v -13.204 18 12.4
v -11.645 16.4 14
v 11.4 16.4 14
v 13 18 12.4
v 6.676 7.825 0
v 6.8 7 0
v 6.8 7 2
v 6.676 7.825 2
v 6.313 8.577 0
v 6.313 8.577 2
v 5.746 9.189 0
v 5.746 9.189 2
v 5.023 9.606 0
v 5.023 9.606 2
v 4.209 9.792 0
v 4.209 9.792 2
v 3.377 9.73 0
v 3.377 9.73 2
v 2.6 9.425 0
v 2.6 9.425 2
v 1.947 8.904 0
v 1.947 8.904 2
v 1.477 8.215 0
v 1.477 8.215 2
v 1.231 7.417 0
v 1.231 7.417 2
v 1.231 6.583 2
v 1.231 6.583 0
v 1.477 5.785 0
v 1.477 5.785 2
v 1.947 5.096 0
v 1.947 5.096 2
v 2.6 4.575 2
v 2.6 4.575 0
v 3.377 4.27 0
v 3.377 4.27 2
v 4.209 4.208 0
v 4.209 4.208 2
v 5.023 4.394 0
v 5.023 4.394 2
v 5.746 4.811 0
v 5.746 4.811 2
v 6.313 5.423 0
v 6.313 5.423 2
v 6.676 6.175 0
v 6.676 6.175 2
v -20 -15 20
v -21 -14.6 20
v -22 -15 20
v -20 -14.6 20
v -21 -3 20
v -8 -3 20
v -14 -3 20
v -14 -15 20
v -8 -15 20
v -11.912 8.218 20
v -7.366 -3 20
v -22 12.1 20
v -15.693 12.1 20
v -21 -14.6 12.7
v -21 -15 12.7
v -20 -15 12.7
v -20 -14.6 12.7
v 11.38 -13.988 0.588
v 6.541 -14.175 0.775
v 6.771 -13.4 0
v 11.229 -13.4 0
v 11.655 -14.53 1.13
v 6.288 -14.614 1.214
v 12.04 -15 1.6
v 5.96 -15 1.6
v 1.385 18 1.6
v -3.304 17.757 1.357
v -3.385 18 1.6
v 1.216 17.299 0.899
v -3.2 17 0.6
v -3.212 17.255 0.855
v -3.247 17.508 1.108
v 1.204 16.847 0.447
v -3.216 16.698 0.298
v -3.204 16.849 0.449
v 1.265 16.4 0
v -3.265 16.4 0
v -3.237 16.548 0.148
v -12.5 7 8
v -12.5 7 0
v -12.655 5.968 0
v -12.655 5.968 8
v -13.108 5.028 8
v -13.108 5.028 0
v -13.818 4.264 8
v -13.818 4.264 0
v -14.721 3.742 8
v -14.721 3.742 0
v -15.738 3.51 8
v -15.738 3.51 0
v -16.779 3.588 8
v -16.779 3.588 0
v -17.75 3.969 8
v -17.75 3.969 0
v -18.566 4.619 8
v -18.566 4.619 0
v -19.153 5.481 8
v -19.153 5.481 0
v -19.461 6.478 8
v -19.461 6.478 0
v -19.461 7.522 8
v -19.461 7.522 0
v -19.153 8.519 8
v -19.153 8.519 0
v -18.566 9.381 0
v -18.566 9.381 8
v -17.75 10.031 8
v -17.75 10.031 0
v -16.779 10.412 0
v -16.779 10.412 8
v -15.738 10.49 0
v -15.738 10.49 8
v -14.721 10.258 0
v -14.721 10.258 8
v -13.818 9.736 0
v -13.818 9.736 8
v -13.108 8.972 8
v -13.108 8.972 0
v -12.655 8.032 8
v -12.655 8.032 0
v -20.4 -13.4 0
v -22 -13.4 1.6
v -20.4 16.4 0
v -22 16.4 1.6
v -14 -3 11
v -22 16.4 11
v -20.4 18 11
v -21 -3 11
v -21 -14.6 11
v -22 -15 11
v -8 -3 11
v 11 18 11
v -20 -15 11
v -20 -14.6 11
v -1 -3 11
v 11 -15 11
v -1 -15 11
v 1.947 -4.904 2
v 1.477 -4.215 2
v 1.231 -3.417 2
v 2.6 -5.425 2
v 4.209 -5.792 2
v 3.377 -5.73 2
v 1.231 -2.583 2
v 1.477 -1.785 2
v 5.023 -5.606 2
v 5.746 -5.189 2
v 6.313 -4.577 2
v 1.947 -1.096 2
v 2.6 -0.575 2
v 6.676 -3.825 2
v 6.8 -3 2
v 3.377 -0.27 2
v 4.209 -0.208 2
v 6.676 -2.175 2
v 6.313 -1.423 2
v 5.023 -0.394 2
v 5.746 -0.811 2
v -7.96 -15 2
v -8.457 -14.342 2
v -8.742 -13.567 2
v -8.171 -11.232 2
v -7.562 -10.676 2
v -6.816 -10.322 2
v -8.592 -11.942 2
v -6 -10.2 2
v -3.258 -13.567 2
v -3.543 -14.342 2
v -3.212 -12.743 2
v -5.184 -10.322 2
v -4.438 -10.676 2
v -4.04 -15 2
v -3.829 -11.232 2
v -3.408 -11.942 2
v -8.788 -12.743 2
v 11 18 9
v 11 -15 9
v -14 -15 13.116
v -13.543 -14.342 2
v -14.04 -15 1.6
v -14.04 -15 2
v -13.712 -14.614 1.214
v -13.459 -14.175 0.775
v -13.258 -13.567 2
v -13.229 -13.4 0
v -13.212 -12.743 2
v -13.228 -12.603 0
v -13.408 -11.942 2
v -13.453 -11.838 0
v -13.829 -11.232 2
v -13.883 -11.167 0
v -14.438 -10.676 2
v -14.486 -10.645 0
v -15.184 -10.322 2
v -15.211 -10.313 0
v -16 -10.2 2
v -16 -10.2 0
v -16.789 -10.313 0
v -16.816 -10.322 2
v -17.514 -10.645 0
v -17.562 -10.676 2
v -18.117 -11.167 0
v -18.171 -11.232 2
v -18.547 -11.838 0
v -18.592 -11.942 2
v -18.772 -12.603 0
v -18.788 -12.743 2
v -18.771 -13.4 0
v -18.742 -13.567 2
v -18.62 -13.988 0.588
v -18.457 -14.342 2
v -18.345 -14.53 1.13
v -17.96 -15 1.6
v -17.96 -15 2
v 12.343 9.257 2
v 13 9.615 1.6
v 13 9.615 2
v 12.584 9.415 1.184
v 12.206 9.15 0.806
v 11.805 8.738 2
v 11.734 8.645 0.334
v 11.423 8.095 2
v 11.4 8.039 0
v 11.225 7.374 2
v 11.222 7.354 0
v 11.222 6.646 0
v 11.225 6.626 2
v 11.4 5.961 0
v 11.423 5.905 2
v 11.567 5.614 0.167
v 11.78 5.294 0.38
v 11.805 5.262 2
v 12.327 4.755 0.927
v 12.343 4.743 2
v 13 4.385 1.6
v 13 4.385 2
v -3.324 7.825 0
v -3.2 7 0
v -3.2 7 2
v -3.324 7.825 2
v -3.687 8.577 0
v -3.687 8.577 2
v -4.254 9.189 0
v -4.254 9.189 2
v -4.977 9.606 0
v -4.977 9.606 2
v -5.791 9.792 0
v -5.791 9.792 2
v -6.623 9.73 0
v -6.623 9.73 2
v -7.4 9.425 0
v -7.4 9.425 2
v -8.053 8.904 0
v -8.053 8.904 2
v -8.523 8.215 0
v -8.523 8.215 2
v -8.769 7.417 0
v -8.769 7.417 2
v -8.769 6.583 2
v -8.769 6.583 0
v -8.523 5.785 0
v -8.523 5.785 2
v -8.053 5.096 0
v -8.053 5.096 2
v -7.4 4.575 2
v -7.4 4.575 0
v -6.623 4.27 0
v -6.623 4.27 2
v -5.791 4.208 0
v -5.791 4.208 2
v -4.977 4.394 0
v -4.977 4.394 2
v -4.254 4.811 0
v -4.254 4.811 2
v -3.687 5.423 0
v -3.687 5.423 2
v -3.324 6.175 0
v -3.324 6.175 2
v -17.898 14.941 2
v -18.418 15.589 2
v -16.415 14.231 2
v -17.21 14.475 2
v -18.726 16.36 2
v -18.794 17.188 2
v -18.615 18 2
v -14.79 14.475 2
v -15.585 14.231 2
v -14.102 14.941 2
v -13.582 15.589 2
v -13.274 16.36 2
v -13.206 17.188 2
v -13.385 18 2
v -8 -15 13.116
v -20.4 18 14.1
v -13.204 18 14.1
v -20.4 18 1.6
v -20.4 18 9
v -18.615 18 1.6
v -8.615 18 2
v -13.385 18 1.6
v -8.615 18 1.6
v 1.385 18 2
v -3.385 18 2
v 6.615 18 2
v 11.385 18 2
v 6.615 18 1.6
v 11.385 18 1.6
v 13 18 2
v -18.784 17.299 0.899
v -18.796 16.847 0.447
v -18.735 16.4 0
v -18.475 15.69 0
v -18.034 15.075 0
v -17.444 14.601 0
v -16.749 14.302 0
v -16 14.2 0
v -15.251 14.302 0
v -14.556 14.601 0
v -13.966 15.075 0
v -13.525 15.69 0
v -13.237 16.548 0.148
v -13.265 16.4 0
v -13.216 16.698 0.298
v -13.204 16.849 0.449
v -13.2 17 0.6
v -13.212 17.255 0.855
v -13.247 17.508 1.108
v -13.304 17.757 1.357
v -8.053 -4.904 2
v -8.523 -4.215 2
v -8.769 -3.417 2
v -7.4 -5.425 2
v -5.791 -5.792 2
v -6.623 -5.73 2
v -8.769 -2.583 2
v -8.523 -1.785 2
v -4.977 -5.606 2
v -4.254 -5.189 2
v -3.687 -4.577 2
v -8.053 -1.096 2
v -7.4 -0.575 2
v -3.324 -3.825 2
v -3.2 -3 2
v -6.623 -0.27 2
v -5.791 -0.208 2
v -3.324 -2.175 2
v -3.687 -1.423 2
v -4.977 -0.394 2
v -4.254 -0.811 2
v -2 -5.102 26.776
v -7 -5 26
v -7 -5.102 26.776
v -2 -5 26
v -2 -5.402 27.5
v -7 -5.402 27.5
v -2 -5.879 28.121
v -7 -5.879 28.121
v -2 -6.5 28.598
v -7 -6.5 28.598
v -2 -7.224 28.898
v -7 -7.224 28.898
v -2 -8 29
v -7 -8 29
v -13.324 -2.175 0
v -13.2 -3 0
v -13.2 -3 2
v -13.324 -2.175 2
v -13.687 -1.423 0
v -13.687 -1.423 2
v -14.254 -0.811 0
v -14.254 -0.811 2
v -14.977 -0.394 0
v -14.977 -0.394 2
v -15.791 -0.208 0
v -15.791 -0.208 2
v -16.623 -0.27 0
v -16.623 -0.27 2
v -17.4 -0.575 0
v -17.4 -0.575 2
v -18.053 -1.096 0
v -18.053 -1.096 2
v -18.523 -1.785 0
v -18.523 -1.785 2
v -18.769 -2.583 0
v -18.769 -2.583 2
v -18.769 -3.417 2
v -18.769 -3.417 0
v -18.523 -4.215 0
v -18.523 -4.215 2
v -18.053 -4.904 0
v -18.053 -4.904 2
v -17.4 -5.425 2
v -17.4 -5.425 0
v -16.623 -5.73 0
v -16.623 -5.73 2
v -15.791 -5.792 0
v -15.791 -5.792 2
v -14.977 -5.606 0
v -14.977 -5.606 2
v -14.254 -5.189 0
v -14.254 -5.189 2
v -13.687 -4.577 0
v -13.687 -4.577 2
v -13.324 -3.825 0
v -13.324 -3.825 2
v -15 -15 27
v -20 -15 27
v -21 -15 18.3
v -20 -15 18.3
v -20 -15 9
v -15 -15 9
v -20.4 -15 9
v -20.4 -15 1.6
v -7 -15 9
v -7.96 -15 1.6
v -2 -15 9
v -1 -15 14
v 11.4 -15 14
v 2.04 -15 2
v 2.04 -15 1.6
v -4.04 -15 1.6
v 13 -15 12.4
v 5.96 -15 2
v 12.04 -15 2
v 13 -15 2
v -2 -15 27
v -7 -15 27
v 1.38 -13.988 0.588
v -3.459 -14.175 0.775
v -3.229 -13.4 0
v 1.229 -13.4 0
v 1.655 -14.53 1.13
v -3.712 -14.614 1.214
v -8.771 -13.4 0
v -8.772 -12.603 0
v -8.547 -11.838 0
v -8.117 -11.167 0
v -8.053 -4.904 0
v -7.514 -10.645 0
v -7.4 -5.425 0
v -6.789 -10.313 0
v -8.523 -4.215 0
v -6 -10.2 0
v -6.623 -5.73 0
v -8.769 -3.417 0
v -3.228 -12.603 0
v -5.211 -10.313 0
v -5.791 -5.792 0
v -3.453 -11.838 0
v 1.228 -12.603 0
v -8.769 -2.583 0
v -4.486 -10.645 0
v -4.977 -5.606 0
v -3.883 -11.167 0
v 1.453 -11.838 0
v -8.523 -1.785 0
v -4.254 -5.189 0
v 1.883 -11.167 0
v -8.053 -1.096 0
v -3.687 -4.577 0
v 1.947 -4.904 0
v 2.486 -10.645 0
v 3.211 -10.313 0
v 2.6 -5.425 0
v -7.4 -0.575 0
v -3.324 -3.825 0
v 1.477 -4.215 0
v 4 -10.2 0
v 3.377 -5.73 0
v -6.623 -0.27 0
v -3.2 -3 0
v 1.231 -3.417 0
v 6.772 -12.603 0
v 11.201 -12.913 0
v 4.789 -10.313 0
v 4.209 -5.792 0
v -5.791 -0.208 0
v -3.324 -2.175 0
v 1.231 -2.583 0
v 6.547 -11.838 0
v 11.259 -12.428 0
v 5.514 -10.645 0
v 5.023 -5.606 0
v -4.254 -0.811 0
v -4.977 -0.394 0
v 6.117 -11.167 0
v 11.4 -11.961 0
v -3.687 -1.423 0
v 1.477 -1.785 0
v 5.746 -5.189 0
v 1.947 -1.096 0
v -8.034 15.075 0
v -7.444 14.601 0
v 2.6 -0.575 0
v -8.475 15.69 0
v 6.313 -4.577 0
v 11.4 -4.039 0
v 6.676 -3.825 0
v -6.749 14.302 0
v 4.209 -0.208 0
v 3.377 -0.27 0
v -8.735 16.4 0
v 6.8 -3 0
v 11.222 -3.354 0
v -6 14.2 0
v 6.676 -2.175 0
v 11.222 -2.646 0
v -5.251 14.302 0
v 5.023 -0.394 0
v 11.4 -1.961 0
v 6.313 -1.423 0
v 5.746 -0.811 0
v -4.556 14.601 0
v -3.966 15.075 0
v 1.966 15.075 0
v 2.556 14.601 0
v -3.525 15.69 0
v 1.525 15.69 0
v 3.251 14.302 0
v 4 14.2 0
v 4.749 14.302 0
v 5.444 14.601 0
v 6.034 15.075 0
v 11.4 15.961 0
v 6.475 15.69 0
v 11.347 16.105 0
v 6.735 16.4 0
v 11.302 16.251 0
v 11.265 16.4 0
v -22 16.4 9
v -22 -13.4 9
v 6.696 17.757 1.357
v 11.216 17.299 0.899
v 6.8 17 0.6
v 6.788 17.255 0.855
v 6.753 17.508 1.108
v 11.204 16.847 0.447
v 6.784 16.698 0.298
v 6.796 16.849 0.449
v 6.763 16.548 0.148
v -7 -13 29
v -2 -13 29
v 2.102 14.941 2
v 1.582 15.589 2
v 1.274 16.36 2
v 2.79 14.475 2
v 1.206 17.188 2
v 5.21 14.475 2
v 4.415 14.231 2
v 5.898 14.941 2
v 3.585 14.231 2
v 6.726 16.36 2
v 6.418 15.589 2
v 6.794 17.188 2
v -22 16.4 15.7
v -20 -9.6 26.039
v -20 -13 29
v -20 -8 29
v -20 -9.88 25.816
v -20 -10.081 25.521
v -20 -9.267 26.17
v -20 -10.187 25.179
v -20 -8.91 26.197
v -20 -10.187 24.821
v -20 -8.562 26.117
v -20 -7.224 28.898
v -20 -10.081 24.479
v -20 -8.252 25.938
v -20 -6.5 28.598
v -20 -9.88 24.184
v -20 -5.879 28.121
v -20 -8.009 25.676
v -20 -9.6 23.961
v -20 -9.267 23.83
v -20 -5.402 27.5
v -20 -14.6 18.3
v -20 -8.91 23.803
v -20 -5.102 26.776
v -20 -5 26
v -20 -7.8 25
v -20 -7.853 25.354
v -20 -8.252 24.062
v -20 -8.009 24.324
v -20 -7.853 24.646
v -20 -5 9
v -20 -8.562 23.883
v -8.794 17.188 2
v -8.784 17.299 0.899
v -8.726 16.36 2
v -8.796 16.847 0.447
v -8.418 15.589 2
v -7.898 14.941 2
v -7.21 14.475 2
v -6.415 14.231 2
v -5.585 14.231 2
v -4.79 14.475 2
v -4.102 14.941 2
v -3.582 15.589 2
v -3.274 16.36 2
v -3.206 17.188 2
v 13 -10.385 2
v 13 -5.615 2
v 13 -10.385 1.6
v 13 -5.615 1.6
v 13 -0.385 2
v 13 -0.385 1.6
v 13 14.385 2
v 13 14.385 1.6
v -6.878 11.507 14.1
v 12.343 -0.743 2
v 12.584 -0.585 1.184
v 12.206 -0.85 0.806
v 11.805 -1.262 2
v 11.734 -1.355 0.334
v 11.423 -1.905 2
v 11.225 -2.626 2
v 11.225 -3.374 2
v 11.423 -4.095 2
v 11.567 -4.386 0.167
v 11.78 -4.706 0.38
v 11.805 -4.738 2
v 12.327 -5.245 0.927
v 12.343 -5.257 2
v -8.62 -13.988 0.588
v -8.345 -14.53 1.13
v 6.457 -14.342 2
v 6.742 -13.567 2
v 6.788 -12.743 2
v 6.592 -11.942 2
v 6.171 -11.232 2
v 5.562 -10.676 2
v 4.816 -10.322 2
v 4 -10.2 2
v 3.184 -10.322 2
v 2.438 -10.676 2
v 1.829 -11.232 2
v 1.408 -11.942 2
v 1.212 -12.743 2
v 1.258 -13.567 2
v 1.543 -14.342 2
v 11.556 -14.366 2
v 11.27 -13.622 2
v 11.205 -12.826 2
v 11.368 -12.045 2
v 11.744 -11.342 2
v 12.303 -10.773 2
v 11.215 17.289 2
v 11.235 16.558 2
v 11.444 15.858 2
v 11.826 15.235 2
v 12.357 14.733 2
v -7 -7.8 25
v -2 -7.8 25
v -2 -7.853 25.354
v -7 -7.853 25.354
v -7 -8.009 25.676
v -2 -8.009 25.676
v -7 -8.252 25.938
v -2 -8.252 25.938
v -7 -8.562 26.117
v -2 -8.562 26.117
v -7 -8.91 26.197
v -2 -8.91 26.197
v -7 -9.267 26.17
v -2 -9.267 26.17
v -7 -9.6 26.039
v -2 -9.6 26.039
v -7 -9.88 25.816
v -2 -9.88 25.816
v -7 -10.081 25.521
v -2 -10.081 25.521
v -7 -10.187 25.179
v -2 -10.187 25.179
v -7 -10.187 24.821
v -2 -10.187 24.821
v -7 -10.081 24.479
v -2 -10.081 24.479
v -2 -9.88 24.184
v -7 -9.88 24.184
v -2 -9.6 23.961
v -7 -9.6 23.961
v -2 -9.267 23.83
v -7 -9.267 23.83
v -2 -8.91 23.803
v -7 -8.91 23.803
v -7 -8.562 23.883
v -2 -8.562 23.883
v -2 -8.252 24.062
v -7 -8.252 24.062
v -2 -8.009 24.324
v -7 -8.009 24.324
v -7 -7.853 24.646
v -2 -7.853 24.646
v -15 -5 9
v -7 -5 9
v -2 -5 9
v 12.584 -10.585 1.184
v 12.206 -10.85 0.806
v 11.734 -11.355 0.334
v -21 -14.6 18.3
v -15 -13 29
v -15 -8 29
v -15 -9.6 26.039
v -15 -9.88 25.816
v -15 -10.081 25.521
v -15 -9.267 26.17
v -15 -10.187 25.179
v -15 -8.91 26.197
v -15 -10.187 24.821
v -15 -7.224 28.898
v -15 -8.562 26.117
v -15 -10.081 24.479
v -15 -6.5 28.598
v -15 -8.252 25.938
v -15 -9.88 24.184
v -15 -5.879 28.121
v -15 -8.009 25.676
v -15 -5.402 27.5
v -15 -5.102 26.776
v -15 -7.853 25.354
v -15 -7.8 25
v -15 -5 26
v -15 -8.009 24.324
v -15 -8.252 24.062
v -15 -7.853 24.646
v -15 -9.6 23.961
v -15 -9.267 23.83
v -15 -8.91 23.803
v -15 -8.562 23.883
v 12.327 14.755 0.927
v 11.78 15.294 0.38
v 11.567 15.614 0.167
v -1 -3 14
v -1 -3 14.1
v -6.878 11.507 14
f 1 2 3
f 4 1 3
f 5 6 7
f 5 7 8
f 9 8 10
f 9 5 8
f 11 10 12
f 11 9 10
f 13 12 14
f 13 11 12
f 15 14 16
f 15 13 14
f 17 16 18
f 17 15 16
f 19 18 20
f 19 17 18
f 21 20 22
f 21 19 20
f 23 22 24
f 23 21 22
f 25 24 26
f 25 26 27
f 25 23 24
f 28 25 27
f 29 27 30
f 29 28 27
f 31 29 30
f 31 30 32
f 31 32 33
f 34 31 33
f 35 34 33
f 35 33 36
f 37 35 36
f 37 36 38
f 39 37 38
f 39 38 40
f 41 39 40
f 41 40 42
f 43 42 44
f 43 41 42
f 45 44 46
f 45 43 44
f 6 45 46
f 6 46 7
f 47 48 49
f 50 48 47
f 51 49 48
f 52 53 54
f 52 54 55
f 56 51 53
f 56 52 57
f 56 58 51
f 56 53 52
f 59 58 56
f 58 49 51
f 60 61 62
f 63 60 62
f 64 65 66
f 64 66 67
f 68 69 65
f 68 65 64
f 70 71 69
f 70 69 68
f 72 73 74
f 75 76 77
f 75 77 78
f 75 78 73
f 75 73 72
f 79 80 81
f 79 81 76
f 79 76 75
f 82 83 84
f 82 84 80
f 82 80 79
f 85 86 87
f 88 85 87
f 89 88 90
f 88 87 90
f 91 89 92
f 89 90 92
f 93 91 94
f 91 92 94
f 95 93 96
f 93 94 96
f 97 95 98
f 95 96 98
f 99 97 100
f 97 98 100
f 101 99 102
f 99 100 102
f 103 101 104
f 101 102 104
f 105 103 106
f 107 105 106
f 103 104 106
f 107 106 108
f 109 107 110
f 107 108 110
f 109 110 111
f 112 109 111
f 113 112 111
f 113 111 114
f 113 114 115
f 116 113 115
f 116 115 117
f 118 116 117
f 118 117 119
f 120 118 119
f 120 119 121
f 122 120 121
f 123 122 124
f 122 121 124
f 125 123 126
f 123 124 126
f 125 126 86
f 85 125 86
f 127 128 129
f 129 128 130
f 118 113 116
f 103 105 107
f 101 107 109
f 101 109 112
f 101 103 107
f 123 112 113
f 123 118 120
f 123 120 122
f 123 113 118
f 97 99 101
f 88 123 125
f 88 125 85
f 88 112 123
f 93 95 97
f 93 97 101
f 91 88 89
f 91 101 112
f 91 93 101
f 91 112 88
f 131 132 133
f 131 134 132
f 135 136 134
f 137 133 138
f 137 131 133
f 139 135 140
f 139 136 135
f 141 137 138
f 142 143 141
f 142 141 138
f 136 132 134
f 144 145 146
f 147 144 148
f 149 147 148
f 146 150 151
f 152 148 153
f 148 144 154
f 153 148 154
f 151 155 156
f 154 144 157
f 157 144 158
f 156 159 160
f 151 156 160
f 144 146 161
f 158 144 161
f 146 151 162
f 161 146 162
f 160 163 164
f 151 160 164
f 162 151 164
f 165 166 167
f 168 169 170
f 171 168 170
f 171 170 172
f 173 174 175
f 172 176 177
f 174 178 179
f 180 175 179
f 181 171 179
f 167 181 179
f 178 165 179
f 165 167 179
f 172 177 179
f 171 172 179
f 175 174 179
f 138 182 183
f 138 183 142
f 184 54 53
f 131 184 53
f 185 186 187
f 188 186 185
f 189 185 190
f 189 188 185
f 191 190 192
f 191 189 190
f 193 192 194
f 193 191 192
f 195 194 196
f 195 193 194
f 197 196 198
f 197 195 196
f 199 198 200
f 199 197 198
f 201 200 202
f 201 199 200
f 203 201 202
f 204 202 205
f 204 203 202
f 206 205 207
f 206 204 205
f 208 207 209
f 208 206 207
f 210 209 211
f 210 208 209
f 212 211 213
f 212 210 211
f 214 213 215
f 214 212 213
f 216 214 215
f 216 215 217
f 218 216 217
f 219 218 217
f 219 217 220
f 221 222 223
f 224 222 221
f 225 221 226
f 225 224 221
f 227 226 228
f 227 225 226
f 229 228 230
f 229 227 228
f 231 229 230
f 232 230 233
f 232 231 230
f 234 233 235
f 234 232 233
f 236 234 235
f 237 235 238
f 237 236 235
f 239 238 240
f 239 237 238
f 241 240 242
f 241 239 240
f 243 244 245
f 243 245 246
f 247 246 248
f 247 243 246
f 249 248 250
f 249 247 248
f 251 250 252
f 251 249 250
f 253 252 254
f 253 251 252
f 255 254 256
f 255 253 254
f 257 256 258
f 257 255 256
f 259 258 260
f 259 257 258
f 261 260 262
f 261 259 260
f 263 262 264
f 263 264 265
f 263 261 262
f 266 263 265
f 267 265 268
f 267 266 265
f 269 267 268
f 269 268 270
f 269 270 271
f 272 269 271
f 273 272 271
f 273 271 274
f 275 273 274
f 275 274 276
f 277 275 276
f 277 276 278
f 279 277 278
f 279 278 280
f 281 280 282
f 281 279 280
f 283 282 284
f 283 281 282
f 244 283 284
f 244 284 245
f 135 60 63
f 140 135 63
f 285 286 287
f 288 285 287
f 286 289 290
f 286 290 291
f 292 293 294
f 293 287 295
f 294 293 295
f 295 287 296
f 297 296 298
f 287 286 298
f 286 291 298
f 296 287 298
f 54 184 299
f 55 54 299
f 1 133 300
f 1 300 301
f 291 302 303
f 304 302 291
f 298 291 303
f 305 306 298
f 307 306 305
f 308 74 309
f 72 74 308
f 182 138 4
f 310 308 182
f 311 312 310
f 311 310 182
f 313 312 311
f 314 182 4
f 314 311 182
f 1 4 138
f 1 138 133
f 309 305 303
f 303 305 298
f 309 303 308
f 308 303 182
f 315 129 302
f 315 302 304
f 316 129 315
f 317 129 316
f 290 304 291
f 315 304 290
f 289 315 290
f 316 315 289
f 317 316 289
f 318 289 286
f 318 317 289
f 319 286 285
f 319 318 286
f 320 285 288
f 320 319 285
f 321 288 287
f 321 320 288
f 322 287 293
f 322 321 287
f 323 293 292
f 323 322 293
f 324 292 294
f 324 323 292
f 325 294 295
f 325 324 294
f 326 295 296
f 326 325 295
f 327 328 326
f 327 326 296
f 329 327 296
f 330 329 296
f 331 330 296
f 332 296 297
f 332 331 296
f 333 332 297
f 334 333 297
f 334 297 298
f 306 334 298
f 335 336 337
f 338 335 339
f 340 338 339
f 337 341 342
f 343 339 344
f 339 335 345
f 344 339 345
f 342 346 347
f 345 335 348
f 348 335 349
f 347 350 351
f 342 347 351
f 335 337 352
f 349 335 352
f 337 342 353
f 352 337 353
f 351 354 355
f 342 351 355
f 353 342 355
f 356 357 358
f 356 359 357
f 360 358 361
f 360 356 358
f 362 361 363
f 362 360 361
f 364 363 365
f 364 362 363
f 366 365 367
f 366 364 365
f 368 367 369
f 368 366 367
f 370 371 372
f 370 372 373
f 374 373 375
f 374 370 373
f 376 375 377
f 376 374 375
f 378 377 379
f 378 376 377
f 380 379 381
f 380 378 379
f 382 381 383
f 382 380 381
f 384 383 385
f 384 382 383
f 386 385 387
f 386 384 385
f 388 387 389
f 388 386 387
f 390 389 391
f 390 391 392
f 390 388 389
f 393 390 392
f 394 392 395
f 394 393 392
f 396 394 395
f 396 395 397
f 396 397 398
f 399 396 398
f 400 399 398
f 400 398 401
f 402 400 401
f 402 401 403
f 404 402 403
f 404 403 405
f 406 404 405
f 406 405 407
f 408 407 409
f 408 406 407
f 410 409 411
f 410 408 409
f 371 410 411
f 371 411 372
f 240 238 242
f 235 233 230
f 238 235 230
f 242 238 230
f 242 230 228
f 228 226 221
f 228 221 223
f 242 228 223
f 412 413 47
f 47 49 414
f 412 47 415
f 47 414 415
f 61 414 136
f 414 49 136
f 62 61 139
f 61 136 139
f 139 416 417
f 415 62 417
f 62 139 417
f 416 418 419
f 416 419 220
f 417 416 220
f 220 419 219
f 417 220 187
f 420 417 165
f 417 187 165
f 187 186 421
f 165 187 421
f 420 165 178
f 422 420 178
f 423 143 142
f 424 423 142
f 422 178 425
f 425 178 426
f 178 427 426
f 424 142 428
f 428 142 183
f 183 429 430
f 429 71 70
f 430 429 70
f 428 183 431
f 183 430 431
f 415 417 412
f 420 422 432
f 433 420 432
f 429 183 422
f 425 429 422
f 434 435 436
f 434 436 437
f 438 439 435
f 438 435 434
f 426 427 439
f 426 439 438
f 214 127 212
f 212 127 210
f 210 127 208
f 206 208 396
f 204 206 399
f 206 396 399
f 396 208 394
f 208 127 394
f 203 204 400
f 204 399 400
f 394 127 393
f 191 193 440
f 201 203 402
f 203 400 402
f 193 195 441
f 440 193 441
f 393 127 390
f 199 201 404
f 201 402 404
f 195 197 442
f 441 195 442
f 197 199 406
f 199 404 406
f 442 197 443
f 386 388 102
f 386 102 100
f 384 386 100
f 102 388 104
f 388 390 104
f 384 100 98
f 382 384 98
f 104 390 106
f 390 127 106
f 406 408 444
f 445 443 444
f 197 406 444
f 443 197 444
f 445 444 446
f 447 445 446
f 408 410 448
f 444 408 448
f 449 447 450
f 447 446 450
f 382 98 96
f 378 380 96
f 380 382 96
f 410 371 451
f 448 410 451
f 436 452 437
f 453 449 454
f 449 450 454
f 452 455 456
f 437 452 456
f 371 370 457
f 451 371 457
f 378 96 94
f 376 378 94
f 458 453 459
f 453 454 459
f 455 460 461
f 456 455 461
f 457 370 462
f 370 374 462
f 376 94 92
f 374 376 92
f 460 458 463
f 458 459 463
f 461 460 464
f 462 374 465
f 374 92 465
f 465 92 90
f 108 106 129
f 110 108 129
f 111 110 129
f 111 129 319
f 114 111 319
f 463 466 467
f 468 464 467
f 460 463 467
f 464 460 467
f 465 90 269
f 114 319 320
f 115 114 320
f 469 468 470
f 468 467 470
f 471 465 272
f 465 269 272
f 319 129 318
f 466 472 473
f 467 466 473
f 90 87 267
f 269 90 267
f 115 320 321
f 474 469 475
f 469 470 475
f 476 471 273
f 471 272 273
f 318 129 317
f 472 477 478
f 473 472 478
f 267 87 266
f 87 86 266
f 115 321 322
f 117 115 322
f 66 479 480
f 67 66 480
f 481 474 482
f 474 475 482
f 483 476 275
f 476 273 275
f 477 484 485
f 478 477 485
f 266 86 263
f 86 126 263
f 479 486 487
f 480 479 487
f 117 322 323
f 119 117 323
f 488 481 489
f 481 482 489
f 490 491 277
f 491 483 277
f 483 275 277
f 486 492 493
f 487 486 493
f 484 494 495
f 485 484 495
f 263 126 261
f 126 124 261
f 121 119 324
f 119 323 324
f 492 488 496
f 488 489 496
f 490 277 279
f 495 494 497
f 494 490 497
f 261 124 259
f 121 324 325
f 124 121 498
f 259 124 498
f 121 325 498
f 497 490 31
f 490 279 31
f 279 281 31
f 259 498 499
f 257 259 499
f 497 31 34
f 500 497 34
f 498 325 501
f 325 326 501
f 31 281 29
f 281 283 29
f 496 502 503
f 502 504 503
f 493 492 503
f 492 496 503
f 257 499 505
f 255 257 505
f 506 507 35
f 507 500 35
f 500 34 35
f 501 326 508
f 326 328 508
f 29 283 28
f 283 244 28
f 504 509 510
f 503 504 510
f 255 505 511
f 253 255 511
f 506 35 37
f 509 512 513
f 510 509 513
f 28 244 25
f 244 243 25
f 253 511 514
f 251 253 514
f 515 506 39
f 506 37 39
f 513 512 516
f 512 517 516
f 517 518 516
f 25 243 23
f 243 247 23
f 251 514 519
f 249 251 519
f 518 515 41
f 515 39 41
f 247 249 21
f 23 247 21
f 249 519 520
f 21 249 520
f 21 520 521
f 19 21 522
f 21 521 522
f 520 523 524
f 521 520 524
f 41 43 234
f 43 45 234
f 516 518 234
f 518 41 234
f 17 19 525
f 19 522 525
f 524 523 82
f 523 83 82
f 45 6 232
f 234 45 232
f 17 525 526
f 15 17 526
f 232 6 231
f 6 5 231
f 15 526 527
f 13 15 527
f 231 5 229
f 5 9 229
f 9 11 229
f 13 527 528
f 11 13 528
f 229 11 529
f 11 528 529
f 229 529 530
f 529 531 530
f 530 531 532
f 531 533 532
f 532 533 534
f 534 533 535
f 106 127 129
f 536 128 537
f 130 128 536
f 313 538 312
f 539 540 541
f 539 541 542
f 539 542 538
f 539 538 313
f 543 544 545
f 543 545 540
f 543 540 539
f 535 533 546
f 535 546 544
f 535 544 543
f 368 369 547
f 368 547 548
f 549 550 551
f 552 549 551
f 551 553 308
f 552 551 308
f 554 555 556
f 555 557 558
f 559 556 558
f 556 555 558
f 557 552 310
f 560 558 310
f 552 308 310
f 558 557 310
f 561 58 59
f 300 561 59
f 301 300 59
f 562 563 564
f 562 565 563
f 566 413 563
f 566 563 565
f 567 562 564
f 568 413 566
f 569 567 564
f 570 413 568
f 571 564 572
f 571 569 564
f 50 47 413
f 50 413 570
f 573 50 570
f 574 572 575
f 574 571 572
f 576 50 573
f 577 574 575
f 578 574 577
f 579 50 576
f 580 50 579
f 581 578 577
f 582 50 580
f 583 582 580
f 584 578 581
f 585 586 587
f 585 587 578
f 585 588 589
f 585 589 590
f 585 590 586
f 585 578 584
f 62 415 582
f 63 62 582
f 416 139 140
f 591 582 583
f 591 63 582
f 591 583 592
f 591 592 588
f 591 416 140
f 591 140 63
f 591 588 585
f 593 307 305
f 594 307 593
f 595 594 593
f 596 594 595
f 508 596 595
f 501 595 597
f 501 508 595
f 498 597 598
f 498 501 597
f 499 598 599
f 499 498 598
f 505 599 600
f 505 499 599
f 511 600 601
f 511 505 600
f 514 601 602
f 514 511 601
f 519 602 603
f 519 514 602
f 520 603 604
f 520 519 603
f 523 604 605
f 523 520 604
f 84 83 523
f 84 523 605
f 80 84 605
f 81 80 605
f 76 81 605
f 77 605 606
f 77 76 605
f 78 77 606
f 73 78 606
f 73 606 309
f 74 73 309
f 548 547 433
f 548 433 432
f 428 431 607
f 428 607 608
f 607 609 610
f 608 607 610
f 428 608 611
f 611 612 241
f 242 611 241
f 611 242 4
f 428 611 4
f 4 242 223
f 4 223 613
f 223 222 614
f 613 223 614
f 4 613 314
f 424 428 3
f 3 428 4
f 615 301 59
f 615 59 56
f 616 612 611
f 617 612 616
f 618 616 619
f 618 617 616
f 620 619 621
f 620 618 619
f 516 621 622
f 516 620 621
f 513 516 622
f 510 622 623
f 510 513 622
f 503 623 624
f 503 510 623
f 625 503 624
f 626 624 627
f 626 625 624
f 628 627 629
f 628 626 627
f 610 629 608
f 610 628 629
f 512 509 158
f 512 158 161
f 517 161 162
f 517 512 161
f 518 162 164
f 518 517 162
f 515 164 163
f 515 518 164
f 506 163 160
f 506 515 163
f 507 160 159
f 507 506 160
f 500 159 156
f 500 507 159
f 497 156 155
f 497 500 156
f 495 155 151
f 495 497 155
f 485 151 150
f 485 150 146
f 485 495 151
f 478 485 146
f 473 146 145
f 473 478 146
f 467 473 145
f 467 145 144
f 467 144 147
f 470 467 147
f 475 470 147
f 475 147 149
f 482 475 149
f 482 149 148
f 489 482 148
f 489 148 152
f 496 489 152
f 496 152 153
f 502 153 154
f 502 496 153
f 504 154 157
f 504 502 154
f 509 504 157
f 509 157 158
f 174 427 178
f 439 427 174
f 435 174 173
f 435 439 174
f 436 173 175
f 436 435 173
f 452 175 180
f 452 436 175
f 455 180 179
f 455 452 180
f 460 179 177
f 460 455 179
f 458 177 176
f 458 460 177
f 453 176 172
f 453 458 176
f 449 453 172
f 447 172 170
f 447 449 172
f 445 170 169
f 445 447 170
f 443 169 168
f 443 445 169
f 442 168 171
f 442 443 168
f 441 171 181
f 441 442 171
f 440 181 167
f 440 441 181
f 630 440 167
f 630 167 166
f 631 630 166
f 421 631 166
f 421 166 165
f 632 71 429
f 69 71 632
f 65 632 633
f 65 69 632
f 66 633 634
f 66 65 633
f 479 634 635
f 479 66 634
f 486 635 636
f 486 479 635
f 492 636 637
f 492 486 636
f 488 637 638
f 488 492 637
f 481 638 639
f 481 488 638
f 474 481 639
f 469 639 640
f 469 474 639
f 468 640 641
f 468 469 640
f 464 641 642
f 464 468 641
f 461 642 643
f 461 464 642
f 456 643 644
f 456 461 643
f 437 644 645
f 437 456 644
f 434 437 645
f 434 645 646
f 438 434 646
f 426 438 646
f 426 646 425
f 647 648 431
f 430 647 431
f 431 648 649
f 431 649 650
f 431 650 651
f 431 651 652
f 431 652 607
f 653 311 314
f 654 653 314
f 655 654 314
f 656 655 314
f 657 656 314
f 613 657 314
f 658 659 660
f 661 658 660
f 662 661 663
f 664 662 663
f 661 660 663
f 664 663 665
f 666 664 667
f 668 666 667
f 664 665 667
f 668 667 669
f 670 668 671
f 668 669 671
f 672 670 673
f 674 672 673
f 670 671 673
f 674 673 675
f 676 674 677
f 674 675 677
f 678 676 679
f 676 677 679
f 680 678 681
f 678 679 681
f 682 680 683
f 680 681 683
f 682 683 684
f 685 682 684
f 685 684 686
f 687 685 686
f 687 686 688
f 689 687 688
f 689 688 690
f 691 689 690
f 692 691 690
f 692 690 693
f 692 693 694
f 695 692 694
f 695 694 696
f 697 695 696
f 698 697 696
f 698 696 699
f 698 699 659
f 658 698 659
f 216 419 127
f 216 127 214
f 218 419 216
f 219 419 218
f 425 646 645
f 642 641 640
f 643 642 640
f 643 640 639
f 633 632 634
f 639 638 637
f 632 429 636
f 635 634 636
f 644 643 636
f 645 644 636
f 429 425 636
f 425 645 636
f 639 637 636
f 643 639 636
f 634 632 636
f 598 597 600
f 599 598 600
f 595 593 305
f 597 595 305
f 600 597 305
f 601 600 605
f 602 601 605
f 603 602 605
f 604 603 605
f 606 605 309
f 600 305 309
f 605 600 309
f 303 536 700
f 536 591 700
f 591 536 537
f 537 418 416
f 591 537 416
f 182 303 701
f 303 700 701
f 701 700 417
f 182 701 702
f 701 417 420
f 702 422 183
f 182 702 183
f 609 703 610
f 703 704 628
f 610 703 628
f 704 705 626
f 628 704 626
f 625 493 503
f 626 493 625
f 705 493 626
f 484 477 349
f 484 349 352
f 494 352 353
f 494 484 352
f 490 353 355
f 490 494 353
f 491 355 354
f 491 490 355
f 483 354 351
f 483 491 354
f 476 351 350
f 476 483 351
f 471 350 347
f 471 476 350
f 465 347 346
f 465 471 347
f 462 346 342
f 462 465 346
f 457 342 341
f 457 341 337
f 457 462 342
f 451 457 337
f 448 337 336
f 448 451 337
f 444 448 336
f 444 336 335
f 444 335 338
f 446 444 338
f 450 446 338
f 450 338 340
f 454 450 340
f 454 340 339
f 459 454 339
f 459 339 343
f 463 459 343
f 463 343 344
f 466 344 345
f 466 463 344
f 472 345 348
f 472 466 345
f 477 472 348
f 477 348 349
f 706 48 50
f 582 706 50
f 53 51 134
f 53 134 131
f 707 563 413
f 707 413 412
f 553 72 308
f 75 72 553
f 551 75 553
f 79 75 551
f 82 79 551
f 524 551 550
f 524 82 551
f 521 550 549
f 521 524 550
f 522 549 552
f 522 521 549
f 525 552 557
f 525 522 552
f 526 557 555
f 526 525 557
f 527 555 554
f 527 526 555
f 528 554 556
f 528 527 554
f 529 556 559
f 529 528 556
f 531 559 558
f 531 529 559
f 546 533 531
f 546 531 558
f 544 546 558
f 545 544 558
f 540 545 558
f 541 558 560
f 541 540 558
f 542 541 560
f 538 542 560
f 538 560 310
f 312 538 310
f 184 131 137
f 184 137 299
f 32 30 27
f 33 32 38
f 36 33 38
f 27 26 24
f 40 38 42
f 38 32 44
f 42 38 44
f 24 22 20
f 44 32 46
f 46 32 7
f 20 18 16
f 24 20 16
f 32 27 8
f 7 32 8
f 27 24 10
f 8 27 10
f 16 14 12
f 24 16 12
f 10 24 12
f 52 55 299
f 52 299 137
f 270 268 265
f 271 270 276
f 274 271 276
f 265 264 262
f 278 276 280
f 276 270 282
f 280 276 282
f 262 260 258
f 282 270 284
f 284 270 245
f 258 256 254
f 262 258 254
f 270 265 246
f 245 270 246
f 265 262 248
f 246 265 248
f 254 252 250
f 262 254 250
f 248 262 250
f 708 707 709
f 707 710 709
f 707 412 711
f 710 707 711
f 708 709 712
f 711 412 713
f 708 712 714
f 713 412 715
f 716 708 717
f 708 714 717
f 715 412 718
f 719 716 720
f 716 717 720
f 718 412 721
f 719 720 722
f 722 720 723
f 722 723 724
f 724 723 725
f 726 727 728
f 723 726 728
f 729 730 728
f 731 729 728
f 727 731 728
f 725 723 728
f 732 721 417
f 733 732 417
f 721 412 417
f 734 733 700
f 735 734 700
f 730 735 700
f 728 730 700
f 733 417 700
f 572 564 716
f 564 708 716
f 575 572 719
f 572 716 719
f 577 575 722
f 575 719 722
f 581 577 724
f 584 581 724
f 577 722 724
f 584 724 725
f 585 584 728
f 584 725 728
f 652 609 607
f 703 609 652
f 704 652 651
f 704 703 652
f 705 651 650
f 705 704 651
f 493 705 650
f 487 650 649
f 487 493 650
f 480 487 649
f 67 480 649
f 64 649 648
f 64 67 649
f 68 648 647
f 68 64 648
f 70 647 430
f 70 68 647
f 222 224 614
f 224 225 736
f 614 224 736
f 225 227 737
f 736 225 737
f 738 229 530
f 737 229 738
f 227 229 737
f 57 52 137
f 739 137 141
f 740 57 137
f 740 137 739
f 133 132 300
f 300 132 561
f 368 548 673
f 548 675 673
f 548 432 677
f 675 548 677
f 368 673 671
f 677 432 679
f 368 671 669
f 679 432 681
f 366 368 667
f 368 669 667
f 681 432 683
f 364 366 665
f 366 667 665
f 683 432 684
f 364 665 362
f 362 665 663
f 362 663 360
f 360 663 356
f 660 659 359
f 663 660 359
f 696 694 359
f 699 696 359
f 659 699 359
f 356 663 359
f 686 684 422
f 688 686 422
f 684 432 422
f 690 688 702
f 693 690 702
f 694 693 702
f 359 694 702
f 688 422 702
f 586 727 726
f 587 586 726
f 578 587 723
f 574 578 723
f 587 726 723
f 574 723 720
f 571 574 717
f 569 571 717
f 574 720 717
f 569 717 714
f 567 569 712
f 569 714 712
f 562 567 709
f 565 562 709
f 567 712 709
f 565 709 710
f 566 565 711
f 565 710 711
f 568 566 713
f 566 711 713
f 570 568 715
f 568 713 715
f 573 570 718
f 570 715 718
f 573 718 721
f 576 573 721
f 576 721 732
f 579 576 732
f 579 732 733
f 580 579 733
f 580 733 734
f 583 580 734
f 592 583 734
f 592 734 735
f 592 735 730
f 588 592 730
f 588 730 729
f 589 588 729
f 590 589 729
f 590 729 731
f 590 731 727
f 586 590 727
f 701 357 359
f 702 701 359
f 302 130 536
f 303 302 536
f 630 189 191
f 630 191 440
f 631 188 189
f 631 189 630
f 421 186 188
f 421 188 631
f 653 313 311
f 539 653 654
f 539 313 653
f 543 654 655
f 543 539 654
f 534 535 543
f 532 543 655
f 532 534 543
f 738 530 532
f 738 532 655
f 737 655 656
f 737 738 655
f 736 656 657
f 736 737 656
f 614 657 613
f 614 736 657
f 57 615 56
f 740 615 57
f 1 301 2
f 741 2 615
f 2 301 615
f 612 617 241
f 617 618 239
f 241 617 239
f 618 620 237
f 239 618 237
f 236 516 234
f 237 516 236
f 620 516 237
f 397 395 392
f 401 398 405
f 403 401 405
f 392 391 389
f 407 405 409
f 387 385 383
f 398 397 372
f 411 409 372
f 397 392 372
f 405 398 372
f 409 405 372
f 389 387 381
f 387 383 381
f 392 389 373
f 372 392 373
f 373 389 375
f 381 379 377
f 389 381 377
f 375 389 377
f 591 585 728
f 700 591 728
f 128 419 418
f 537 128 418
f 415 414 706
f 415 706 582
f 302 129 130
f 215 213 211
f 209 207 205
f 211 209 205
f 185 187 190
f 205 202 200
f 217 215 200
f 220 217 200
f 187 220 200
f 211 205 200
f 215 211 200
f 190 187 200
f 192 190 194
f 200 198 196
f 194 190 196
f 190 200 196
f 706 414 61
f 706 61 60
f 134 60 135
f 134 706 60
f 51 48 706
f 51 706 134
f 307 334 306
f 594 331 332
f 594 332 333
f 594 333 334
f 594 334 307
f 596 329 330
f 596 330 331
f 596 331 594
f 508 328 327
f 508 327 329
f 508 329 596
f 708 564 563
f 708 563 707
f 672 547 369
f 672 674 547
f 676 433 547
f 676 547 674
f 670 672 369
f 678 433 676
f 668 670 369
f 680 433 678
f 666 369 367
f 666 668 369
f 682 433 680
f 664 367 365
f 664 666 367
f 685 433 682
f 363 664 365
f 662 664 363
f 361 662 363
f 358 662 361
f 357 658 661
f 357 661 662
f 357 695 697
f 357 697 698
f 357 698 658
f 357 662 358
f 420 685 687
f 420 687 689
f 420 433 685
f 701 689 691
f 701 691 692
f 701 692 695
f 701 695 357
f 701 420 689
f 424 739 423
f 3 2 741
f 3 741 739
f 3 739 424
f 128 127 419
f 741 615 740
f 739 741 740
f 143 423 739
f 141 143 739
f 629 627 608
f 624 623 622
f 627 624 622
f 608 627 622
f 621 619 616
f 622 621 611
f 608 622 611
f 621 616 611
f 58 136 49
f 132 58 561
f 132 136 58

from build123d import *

# Parameters (mm, degrees)
SKETCH_W             = 35
SKETCH_H             = 33
PAD_DEPTH            = 20
SKETCH001_W          = 7
SKETCH001_H          = 12
POCKET_DEPTH         = 10
SKETCH004_W          = 36
SKETCH004_H          = 2
POCKET002_DEPTH      = 18.001
POCKET002_DEPTH_BACK = 15.001
SKETCH002_W          = 5
SKETCH002_H          = 10
PAD001_DEPTH         = 20
SKETCH003_R          = 1.2
POCKET001_DEPTH      = 22.001
POCKET003_DEPTH      = 6
CHAMFER_SIZE         = 5.9
CHAMFER001_SIZE      = 1.6
CHAMFER002_SIZE      = 2
FILLET_R             = 3
SKETCH010_R          = 2.8
POCKET006_DEPTH      = 2
LINEARPATTERN_COUNT  = 4
LINEARPATTERN_PITCH  = 10
SKETCH012_R          = 3.5
POCKET007_DEPTH      = 8
SKETCH013_W          = 3.523392
SKETCH013_H          = 1.7
SKETCH013_W_2        = 3.89822
PAD003_DEPTH         = 0.4
POCKET008_DEPTH      = 6


with BuildPart() as part:
    # Sketch → Pad (new body)
    with BuildSketch(Plane.XY):
        with Locations((-4.5, 1.5)):
            Rectangle(SKETCH_W, SKETCH_H)
    extrude(amount=PAD_DEPTH)

    # Sketch001 (on Face6 of Pad) → Pocket (cut)
    with BuildSketch(Plane.XY.offset(20)):
        with Locations((-17.5, -9)):
            Rectangle(SKETCH001_W, SKETCH001_H)
        with Locations((-4.5, -9)):
            Rectangle(SKETCH001_W, SKETCH001_H)
    extrude(amount=-POCKET_DEPTH, mode=Mode.SUBTRACT)

    # Sketch004 → Pocket002 (cut, two sides)
    with BuildSketch(Plane.XZ) as pocket002_sk:
        with Locations((-7, 10)):
            Rectangle(SKETCH004_W, SKETCH004_H)
    extrude(amount=-POCKET002_DEPTH, mode=Mode.SUBTRACT)
    extrude(pocket002_sk.sketch, amount=POCKET002_DEPTH_BACK, mode=Mode.SUBTRACT)

    # Sketch002 (on Face8 of Pocket002) → Pad001 (join)
    with BuildSketch(Plane.XY.offset(9)):
        with Locations((-17.5, -10)):
            Rectangle(SKETCH002_W, SKETCH002_H)
        with Locations((-4.5, -10)):
            Rectangle(SKETCH002_W, SKETCH002_H)
    extrude(amount=PAD001_DEPTH)

    # Sketch003 → Pocket001 (cut, through all)
    with BuildSketch(Plane.YZ):
        with Locations((-9, 25)):
            Circle(SKETCH003_R)
    extrude(amount=-POCKET001_DEPTH, mode=Mode.SUBTRACT)

    # Sketch005 (on Face4 of Pocket001) → Pocket003 (cut)
    with BuildSketch(Plane.XY.offset(20)):
        Polygon((-6.878414, 11.506697), (-1, -3), (-1, -16.521692), (16.145611, -16.521692), (16.145611, 20.333527), (-18.556482, 20.333527), (-13.204168, 18), align=None)
    extrude(amount=-POCKET003_DEPTH, mode=Mode.SUBTRACT)

    # Chamfer
    chamfer_edges = [part.edges().sort_by_distance(p)[0] for p in [
        (-17.602084, 18, 20),
        (-10.041291, 14.753349, 20),
        (-3.939207, 4.253349, 20),
    ]]
    chamfer(chamfer_edges, length=CHAMFER_SIZE)

    # Chamfer001
    chamfer001_edges = [part.edges().sort_by_distance(p)[0] for p in [
        (-4.5, 18, 0),
        (13, 1.5, 0),
        (-4.5, -15, 0),
        (-22, 1.5, 0),
        (-22, 18, 4.5),
        (-22, -15, 4.5),
        (-22, 18, 12.55),
        (13, 1.5, 14),
        (-0.102084, 18, 14),
    ]]
    chamfer(chamfer001_edges, length=CHAMFER001_SIZE)

    # Chamfer002
    chamfer002_edges = [part.edges().sort_by_distance(p)[0] for p in [
        (-17.5, -15, 29),
        (-4.5, -15, 29),
    ]]
    chamfer(chamfer002_edges, length=CHAMFER002_SIZE)

    # Fillet
    fillet_edges = [part.edges().sort_by_distance(p)[0] for p in [
        (-4.5, -5, 29),
        (-17.5, -5, 29),
    ]]
    fillet(fillet_edges, radius=FILLET_R)

    # Sketch010 → Pocket006 (cut)
    with BuildSketch(Plane.XY):
        with Locations((14, -13)):
            Circle(SKETCH010_R)
        with Locations((4, -13)):
            Circle(SKETCH010_R)
        with Locations((-6, -13)):
            Circle(SKETCH010_R)
        with Locations((-16, -13)):
            Circle(SKETCH010_R)
    pocket006 = extrude(amount=POCKET006_DEPTH, mode=Mode.SUBTRACT)

    # LinearPattern: Pocket006 ×4
    with Locations(*[(0, i * LINEARPATTERN_PITCH, 0) for i in range(1, LINEARPATTERN_COUNT)]):
        add(pocket006, mode=Mode.SUBTRACT)

    # Sketch012 (on Face5 of Pad) → Pocket007 (cut)
    with BuildSketch(Plane(origin=(0, 0, 0), x_dir=(1, 0, 0), z_dir=(0, 0, -1))):
        with Locations((-16, -7)):
            Circle(SKETCH012_R)
    extrude(amount=-POCKET007_DEPTH, mode=Mode.SUBTRACT)

    # Sketch013 (on Face3 of Pad) → Pad003 (join)
    with BuildSketch(Plane.XZ.offset(15)):
        with Locations((-19.82605, 19.15)):
            Rectangle(SKETCH013_W, SKETCH013_H)
        with Locations((-19.451214, 11.85)):
            Rectangle(SKETCH013_W_2, SKETCH013_H)
    extrude(amount=-PAD003_DEPTH)

    # Sketch014 (on Face9 of Pocket) → Pocket008 (cut)
    with BuildSketch(Plane(origin=(-14, 0, 0), x_dir=(0, -1, 0), z_dir=(-1, 0, 0))):
        Polygon((3, 11), (23, 14.52654), (23, 11), align=None)
    extrude(amount=-POCKET008_DEPTH, mode=Mode.SUBTRACT)


solid = part.part
